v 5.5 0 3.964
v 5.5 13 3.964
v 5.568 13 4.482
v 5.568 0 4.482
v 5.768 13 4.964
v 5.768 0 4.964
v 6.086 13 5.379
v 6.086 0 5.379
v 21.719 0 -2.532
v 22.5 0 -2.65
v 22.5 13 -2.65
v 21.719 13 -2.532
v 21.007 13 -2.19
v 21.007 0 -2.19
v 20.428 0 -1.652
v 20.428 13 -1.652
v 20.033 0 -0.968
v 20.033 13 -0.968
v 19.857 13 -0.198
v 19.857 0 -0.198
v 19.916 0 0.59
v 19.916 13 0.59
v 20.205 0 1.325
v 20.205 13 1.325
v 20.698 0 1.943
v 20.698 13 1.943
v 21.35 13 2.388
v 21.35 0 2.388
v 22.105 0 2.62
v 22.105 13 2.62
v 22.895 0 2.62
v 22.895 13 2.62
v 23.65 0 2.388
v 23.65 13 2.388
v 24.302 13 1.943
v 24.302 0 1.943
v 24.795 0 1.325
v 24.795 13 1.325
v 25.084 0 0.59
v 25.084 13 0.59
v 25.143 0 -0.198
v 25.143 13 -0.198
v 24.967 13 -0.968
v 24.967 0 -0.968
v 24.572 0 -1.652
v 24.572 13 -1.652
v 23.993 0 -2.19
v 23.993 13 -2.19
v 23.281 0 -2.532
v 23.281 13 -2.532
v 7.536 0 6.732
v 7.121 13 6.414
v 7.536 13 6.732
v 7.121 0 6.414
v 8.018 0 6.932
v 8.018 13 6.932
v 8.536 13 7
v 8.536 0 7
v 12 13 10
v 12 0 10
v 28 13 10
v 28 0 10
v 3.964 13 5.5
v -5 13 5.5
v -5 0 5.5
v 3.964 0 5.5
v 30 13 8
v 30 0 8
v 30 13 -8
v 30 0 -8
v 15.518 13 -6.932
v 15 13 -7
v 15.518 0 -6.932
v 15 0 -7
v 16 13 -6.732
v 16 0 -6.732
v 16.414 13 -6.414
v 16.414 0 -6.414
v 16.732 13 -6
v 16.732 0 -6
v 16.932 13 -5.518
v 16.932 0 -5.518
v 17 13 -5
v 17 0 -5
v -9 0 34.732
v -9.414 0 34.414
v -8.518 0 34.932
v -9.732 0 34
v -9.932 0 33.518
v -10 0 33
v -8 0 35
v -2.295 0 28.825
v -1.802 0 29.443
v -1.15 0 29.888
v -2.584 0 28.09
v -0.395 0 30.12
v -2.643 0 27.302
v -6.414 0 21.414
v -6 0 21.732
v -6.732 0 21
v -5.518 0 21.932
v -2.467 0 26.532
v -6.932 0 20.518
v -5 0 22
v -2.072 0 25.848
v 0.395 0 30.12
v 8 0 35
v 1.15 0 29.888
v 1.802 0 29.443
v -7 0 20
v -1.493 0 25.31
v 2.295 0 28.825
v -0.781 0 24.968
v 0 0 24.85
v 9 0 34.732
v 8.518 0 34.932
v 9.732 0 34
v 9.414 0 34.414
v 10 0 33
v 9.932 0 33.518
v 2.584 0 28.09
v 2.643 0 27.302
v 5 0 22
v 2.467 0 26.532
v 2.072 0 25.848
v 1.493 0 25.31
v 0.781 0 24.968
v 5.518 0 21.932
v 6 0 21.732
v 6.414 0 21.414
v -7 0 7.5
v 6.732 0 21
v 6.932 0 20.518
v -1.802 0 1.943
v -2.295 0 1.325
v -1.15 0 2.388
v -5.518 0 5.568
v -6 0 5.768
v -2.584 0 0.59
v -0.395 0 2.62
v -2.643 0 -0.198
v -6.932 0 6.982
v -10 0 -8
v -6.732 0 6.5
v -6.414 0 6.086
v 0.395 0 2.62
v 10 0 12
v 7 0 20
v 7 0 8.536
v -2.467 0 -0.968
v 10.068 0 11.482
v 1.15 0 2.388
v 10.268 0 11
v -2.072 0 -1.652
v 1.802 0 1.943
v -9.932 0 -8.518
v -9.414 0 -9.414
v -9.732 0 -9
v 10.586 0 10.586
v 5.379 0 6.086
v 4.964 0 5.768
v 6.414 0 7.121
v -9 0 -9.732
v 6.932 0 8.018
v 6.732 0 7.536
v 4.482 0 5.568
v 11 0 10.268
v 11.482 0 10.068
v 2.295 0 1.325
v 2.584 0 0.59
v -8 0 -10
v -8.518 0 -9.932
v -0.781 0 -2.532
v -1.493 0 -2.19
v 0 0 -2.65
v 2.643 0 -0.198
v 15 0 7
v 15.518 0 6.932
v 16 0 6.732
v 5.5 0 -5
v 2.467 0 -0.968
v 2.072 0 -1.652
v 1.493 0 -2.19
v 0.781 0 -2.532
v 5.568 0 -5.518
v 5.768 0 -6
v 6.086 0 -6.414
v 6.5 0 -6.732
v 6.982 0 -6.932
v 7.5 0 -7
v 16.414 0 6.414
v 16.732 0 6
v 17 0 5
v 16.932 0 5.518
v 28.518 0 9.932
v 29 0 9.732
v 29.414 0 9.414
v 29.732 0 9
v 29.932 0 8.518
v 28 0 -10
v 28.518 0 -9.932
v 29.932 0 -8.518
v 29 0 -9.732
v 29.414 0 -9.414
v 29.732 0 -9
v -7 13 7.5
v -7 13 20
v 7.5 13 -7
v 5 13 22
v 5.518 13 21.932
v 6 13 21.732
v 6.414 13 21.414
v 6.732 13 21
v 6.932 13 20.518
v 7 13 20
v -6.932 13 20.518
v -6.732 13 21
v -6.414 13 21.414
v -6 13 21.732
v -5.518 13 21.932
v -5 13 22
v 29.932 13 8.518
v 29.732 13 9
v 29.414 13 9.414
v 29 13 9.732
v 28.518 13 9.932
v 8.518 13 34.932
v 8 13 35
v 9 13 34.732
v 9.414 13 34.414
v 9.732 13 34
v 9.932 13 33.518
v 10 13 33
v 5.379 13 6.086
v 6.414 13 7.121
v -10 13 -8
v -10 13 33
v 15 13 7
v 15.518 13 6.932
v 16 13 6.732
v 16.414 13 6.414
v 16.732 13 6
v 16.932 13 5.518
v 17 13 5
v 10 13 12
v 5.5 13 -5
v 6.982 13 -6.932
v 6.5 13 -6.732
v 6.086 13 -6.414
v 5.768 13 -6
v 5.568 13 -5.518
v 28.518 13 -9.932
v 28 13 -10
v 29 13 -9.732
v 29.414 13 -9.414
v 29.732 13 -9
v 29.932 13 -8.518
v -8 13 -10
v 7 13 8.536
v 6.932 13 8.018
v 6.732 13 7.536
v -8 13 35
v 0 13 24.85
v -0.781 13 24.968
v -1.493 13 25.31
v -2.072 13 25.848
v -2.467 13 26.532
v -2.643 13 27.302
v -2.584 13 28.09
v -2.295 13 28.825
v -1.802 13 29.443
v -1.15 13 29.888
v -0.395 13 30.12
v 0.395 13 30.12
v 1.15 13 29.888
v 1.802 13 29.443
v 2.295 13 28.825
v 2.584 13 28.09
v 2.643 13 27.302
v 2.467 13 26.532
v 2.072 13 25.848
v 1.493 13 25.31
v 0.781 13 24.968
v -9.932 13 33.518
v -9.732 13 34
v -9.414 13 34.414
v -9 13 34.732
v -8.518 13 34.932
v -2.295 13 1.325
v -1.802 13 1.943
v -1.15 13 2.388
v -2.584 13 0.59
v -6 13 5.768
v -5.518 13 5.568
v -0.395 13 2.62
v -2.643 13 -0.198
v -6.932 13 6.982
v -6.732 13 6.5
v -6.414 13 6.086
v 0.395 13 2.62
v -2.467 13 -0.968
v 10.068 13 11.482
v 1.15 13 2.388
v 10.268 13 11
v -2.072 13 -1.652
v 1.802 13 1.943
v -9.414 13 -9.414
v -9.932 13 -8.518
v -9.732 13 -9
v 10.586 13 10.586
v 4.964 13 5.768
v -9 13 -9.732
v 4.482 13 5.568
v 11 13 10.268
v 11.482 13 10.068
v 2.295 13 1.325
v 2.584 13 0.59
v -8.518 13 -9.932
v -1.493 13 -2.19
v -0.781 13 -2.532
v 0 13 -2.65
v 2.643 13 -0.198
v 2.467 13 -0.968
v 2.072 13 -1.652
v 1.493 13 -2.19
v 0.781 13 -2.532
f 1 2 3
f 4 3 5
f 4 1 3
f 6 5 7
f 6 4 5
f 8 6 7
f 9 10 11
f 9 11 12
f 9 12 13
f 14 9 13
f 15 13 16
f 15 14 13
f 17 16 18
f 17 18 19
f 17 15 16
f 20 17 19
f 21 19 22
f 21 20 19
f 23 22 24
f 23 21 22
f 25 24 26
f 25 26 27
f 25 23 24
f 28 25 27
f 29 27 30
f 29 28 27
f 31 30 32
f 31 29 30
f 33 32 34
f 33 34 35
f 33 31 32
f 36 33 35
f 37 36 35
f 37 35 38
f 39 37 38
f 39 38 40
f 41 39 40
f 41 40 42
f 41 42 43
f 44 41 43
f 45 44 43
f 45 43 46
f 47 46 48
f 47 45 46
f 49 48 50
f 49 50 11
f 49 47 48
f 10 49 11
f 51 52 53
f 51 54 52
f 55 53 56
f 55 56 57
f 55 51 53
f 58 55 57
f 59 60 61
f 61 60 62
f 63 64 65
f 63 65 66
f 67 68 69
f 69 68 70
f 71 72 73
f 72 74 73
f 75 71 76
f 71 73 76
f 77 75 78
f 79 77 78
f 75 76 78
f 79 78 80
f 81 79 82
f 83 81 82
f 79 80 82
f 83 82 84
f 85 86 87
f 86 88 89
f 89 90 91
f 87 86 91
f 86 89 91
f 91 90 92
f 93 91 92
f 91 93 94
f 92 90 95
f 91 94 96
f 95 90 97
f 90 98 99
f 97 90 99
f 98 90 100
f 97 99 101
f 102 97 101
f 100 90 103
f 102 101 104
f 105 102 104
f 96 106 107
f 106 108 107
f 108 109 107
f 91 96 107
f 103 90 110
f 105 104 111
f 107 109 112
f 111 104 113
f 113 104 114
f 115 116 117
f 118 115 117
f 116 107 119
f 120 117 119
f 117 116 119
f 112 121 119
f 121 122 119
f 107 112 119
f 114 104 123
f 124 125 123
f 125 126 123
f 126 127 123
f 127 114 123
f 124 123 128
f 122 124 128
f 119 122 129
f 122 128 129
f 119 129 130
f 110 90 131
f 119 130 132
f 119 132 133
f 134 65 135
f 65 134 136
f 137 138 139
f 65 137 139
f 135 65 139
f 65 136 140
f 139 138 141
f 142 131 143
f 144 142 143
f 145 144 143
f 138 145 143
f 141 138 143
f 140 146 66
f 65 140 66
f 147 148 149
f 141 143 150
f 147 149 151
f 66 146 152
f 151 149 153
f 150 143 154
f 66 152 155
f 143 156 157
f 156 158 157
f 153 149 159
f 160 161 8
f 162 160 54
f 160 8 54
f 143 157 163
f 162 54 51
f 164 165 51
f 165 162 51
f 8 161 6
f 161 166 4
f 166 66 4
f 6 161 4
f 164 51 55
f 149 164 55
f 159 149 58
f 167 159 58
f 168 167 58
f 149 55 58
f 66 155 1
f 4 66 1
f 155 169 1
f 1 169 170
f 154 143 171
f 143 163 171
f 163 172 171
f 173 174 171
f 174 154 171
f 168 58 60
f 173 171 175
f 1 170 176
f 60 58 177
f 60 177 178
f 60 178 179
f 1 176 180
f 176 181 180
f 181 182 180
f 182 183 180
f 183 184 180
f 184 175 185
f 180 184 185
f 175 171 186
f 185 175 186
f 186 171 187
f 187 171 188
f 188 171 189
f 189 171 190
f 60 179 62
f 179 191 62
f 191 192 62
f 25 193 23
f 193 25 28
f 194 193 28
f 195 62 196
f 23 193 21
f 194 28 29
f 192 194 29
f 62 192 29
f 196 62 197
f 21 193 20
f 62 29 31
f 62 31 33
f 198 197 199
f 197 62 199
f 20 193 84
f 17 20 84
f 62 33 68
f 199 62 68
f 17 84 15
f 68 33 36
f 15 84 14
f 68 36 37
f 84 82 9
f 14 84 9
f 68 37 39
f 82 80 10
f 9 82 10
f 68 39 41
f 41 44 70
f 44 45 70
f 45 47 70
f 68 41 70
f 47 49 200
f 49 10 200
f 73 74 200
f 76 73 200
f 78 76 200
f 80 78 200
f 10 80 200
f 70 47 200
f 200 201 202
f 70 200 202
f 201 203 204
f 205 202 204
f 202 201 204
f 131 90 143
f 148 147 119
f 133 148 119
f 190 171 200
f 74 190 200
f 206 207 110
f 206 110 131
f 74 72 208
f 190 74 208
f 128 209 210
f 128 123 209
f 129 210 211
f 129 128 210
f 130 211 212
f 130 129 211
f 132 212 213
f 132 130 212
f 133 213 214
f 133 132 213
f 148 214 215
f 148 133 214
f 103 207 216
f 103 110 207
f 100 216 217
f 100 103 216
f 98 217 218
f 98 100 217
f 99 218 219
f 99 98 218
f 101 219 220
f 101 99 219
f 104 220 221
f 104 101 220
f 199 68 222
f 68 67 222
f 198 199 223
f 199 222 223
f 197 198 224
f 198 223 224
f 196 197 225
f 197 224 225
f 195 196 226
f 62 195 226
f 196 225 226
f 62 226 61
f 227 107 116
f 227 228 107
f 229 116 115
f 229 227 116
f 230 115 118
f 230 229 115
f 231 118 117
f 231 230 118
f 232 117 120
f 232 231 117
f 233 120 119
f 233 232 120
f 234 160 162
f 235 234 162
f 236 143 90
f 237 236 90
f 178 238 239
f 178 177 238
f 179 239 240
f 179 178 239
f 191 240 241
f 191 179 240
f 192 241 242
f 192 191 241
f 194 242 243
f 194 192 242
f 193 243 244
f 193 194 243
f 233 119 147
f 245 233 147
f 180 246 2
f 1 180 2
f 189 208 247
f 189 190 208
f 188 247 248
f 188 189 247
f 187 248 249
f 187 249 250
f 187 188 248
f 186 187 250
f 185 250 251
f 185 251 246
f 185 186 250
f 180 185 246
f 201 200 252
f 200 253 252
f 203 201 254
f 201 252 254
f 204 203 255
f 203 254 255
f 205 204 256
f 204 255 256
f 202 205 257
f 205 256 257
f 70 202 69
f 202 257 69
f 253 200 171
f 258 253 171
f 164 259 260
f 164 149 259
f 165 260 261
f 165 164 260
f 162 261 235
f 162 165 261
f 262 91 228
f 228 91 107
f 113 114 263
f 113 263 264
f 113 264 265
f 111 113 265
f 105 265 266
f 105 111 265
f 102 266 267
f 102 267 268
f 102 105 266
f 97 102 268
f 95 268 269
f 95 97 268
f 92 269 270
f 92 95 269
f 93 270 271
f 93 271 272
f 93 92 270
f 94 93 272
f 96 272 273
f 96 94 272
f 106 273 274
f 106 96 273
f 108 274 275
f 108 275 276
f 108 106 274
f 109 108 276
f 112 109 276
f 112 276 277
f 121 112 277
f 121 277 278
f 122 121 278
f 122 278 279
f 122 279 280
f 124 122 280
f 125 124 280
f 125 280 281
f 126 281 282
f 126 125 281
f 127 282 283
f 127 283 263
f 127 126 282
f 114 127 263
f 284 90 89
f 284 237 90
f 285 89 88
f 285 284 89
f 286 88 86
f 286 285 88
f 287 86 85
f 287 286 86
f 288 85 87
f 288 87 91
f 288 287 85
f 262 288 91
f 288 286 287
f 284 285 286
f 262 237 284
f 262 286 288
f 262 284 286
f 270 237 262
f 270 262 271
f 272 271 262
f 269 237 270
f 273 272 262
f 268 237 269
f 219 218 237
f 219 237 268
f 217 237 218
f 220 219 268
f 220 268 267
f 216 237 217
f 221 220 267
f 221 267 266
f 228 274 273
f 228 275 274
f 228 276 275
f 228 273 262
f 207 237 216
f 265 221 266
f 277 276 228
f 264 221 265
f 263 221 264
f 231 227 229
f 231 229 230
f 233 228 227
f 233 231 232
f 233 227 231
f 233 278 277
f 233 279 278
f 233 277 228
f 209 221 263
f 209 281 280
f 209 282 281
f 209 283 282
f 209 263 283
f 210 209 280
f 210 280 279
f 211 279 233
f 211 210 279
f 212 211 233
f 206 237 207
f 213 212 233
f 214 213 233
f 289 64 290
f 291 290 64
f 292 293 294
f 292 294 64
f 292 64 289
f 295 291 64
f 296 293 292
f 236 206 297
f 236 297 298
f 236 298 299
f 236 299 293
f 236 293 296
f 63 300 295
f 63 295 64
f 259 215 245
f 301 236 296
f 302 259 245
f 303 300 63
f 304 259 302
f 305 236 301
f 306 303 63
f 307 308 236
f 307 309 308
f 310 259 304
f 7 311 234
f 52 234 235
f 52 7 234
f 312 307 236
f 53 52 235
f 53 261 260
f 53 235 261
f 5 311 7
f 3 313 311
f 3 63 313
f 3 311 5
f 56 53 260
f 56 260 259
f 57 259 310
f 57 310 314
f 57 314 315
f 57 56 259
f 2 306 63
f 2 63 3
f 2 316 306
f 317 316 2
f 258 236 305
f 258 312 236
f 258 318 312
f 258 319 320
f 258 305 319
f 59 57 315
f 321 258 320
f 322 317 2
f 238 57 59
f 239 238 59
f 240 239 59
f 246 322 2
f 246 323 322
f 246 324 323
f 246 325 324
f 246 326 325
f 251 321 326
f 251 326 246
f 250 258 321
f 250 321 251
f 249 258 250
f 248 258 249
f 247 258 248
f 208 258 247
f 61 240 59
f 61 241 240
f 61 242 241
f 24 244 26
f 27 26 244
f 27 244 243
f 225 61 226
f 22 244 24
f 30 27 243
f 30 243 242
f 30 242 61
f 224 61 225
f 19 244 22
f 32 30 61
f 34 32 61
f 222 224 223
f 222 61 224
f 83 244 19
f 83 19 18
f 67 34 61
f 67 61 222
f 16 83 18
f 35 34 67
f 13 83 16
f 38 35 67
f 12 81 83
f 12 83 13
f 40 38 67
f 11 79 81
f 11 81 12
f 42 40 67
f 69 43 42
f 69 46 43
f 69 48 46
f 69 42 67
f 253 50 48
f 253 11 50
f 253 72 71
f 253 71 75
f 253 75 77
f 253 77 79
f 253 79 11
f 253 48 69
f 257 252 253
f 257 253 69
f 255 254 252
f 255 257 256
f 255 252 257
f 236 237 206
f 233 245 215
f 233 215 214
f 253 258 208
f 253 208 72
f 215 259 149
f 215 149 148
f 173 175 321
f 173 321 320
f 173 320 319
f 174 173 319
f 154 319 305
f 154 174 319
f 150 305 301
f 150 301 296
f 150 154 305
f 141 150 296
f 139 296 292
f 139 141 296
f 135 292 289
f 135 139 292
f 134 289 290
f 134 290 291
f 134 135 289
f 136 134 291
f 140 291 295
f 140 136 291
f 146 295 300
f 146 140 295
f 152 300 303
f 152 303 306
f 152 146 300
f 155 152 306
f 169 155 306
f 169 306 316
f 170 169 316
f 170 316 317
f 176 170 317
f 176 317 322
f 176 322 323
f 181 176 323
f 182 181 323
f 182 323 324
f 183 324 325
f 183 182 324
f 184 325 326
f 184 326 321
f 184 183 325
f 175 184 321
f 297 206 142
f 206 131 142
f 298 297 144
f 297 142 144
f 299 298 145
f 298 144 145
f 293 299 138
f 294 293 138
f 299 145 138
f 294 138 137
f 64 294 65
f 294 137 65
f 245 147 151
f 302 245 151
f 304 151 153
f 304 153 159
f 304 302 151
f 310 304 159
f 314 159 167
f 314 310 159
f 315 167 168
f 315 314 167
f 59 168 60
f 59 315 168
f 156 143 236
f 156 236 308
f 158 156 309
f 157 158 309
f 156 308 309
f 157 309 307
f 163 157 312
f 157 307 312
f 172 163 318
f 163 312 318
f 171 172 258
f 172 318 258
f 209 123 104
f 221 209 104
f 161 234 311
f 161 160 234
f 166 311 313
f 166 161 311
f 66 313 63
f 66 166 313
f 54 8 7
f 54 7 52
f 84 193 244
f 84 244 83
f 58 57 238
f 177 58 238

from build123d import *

# Parameters (mm, degrees)
SKETCH1_R           = 2.65
BOSS_EXTRUDE1_DEPTH = 13
CUT_EXTRUDE1_DEPTH  = 48.895720059
FILLET1_R           = 2


with BuildPart() as part:
    # Sketch1 → Boss-Extrude1 (new body)
    with BuildSketch(Plane(origin=(0, 0, 0), x_dir=(1, 0, 0), z_dir=(0, 1, 0))):
        Polygon((-10, 10), (-10, -35), (10, -35), (10, -10), (30, -10), (30, 10), align=None)
        with Locations(Location((0, 0, 0), (0, 0, 90))):
            Circle(SKETCH1_R, mode=Mode.SUBTRACT)
        with Locations(Location((0, -27.5, 0), (0, 0, 90))):
            Circle(SKETCH1_R, mode=Mode.SUBTRACT)
        with Locations(Location((22.5, 0, 0), (0, 0, 90))):
            Circle(SKETCH1_R, mode=Mode.SUBTRACT)
    extrude(amount=BOSS_EXTRUDE1_DEPTH)

    # Sketch2 → Cut-Extrude1 (cut, through all)
    with BuildSketch(Plane(origin=(0, 13, 0), x_dir=(1, 0, 0), z_dir=(0, 1, 0))):
        Polygon((-7, -5.5), (4.792893219, -5.5), (7, -7.707106781), (7, -22), (-7, -22), align=None)
        Polygon((17, 7), (5.5, 7), (5.5, -4.792893219), (7.707106781, -7), (17, -7), align=None)
    extrude(amount=-CUT_EXTRUDE1_DEPTH, mode=Mode.SUBTRACT)

    # Fillet1
    fillet1_edges = [part.edges().sort_by_distance(p)[0] for p in [
        (30, 6.5, -10),
        (30, 6.5, 10),
        (10, 6.5, 10),
        (10, 6.5, 35),
        (-10, 6.5, 35),
        (-10, 6.5, -10),
        (7.707106781, 6.5, 7),
        (5.5, 6.5, 4.792893219),
        (5.5, 6.5, -7),
        (17, 6.5, -7),
        (17, 6.5, 7),
        (-7, 6.5, 22),
        (-7, 6.5, 5.5),
        (4.792893219, 6.5, 5.5),
        (7, 6.5, 7.707106781),
        (7, 6.5, 22),
    ]]
    fillet(fillet1_edges, radius=FILLET1_R)


solid = part.part
